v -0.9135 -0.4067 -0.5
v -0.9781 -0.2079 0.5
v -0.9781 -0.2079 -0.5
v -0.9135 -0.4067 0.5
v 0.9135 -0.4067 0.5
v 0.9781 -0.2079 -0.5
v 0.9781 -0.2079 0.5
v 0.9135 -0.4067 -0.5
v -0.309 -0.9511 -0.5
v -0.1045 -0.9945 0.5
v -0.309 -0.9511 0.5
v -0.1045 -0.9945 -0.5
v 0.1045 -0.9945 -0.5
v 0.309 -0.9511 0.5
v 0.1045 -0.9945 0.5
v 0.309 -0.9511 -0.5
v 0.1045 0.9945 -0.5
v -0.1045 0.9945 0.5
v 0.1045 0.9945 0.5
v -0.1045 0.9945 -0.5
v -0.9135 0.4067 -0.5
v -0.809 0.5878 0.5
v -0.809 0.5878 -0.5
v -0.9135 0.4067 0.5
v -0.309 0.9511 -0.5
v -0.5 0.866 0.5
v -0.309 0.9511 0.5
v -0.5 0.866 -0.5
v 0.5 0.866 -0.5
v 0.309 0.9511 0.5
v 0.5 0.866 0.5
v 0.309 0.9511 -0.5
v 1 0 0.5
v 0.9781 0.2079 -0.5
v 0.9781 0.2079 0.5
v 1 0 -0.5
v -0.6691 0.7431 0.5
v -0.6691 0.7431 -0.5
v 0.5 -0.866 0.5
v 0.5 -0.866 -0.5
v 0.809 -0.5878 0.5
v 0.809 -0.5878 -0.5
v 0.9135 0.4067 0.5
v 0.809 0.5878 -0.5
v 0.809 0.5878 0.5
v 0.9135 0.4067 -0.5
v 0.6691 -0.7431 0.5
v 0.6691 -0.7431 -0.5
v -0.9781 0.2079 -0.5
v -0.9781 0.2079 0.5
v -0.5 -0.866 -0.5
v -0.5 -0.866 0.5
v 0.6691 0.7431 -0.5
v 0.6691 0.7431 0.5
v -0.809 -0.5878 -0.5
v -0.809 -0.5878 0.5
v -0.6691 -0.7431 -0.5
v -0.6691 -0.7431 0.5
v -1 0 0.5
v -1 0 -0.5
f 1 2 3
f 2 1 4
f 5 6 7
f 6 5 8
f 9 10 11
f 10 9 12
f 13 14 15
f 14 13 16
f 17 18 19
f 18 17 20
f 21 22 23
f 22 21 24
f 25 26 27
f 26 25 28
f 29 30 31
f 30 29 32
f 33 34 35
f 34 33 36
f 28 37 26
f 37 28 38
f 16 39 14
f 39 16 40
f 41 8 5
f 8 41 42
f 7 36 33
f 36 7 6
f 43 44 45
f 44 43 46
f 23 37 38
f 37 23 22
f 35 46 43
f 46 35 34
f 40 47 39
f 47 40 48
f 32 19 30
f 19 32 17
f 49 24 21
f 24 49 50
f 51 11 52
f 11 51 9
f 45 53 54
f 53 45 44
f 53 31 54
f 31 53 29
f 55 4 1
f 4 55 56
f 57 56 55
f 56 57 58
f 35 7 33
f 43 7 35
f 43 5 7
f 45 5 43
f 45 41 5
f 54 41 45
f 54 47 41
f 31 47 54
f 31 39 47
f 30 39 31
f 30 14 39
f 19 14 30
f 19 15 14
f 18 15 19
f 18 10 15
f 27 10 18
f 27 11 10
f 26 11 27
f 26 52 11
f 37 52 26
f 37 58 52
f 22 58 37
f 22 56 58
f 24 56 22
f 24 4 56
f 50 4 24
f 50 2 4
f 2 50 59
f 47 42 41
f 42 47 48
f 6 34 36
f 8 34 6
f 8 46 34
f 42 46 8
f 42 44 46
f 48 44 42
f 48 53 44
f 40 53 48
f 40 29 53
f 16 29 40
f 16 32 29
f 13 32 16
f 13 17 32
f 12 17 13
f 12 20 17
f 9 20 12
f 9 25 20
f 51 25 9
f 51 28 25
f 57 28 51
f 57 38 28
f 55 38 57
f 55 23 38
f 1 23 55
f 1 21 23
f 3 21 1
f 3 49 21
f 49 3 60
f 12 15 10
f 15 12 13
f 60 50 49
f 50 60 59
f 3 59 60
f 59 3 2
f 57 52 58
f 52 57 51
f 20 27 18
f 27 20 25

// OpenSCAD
// file: IKEA Skadis v2 hook cutouts.scad
skadis_hook_width = 4.5;
skadis_hook_height = 46;
skadis_hole_spacing_width = 40; // middle to middle
cutout_tolerance_w = 0.4;
cutout_tolerance_h = 0.6;


module skadis_hook_cutout(center=false, hook_count=2) {
    
    if(center) {
        translate([-(skadis_hole_spacing_width + skadis_hook_width) / 2, 0, - skadis_hook_height / 2])
        object(hook_count);
    } else {
        object();
    }
    

}

module object(hook_count=2) {
    union() {

        // Cutout for the hook 1
        color("red")
        translate([- cutout_tolerance_w / 2, 0, - cutout_tolerance_h / 2])
        cube([skadis_hook_width + cutout_tolerance_w, 2, skadis_hook_height + cutout_tolerance_h]);

        // Cutout for the hook 2
        color("red")
        translate([- cutout_tolerance_w / 2 + skadis_hole_spacing_width, 0, - cutout_tolerance_h / 2])
        cube([skadis_hook_width + cutout_tolerance_w, 2, skadis_hook_height + cutout_tolerance_h]);

    }
}

skadis_hook_cutout(center = false);
// file: ../modules/roundedcube.scad
// More information: https://danielupshaw.com/openscad-rounded-corners/


// Examples
// color("Yellow")
// roundedcube(3, true, 0.7, "xmin");

// translate(v = [1, 0, 2])
// color("Pink")
// roundedcube([4, 2, 2], false, 0.6, "zmax");

// translate(v = [-4, -1, 2])
// color("Lightblue")
// roundedcube(2, false);

// translate(v = [0, 0, 6])
// color("Orange")
// roundedcube([3, 2, 2], true, 0.2);

// translate(v = [2.5, -0.5, 5])
// color("Green")
// roundedcube([3, 2, 2], false, 0.4, "z");

// Set to 0.01 for higher definition curves (renders slower)
$fs = 0.15;

module roundedcube(size = [1, 1, 1], center = false, radius = 0.5, apply_to = "all") {
	// If single value, convert to [x, y, z] vector
	size = (size[0] == undef) ? [size, size, size] : size;

	translate_min = radius;
	translate_xmax = size[0] - radius;
	translate_ymax = size[1] - radius;
	translate_zmax = size[2] - radius;

	diameter = radius * 2;

	obj_translate = (center == false) ?
		[0, 0, 0] : [
			-(size[0] / 2),
			-(size[1] / 2),
			-(size[2] / 2)
		];

	translate(v = obj_translate) {
		hull() {
			for (translate_x = [translate_min, translate_xmax]) {
				x_at = (translate_x == translate_min) ? "min" : "max";
				for (translate_y = [translate_min, translate_ymax]) {
					y_at = (translate_y == translate_min) ? "min" : "max";
					for (translate_z = [translate_min, translate_zmax]) {
						z_at = (translate_z == translate_min) ? "min" : "max";

						translate(v = [translate_x, translate_y, translate_z])
						if (
							(apply_to == "all") ||
							(apply_to == "xmin" && x_at == "min") || (apply_to == "xmax" && x_at == "max") ||
							(apply_to == "ymin" && y_at == "min") || (apply_to == "ymax" && y_at == "max") ||
							(apply_to == "zmin" && z_at == "min") || (apply_to == "zmax" && z_at == "max")
						) {
							sphere(r = radius);
						} else {
							rotate = 
								(apply_to == "xmin" || apply_to == "xmax" || apply_to == "x") ? [0, 90, 0] : (
								(apply_to == "ymin" || apply_to == "ymax" || apply_to == "y") ? [90, 90, 0] :
								[0, 0, 0]
							);
							rotate(a = rotate)
							cylinder(h = diameter, r = radius, center = true);
						}
					}
				}
			}
		}
	}
}
// file: IKEA Skadis v2 Bin.scad
_width = 37 + 1.6 + 1.6;
_depth = 18 + 1.6 + 1.6;
_height = 60;
_thickness = 1.6;  //Recommended minimum 1.6

//use <./IKEA Skadis include backwall with 3 hooks.scad>
use <../modules/roundedcube.scad>
use <./IKEA Skadis v2 hook cutouts.scad>



module bin(_w, _d, _h, _t, _r) {

    difference() {
        translate([0, _d / 2, 0])
        difference() {
            roundedcube(size = [_w, _d, _h], center = true, radius = _r, apply_to = "z");
            color("red")
            translate([0, 0, _t])
            roundedcube(size = [_w - _t * 2, _d - _t * 2, _h - _t * 2 + 1], center = true, radius = _r, apply_to = "z");
        }
        color("green")
        translate([0, -1.4, 0])
        skadis_hook_cutout(center=true, 3);
    }
}

bin(_width, _depth, _height, _thickness);
// main file
_width = 130;
_depth = 45;
_height = 59;
_thickness = 1.6; //Recommended minimum 1.6

_bottom_cutout = 1;
_bottom_cutout_width = 103;
_bottom_cutout_depth = 20;

_right_cutout = 0;
_right_cutout_depth = 13;
_right_cutout_height = 20;
_right_cutout_z_offset = 30; // (_height - _left_cutout_height) / 2
_right_cutout_y_offset = 20; // (_depth - _left_cutout_depth) / 2

_left_cutout = 1;
_left_cutout_depth = 13; //16
_left_cutout_height = 20;
_left_cutout_z_offset = 30; // (_height - _right_cutout_height) / 2
_left_cutout_y_offset = 20; // (_depth - _left_cutout_depth) / 2

_front_cutout = 1;
_front_cutout_width = 50;
_front_cutout_height = 50;
_front_cutout_z_offset = 17; // Middle = (_height - _front_cutout_height) / 2;

use <./IKEA Skadis v2 Bin.scad>
use <../modules/roundedcube.scad>

difference() {
    translate([_width / 2, 0, _height / 2])
    bin(_width, _depth, _height, _thickness);

    // Bottom cutout
    if(_bottom_cutout == 1) {
        translate([(_width - _bottom_cutout_width) / 2, (_depth - _bottom_cutout_depth) / 2, -1])
        //cube([_bottom_cutout_width, _bottom_cutout_depth, _thickness + 2]);
        roundedcube(size = [_bottom_cutout_width, _bottom_cutout_depth, _thickness + 2], center = false, radius = 5, apply_to = "z");
    }

    // Right cutout
    if(_right_cutout == 1) {
        translate([_width - _thickness - 1, _depth - _right_cutout_depth - _right_cutout_y_offset, _left_cutout_z_offset])
        roundedcube(size = [_thickness + 2, _right_cutout_depth, _right_cutout_height], center = false, radius = 2.5, apply_to = "x");
    }

    // Left cutout
    if(_left_cutout == 1) {
        translate([- 1, _depth - _left_cutout_depth - _left_cutout_y_offset, _left_cutout_z_offset])
        roundedcube(size = [_thickness + 2, _left_cutout_depth, _left_cutout_height], center = false, radius = 2.5, apply_to = "x");
    }

    // Front cutout
    if(_front_cutout == 1) {
        color("red")
        translate([(_width - _front_cutout_width) / 2, _depth -1, _front_cutout_z_offset])
        //cube([_bottom_cutout_width, _bottom_cutout_depth, _thickness + 2]);
        roundedcube(size = [_front_cutout_width, _thickness, _front_cutout_height], center = false, radius = 5, apply_to = "y");
    }
}

// color("pink")
// translate([3, 2, 2])
// cube([124, 39, 74]);
